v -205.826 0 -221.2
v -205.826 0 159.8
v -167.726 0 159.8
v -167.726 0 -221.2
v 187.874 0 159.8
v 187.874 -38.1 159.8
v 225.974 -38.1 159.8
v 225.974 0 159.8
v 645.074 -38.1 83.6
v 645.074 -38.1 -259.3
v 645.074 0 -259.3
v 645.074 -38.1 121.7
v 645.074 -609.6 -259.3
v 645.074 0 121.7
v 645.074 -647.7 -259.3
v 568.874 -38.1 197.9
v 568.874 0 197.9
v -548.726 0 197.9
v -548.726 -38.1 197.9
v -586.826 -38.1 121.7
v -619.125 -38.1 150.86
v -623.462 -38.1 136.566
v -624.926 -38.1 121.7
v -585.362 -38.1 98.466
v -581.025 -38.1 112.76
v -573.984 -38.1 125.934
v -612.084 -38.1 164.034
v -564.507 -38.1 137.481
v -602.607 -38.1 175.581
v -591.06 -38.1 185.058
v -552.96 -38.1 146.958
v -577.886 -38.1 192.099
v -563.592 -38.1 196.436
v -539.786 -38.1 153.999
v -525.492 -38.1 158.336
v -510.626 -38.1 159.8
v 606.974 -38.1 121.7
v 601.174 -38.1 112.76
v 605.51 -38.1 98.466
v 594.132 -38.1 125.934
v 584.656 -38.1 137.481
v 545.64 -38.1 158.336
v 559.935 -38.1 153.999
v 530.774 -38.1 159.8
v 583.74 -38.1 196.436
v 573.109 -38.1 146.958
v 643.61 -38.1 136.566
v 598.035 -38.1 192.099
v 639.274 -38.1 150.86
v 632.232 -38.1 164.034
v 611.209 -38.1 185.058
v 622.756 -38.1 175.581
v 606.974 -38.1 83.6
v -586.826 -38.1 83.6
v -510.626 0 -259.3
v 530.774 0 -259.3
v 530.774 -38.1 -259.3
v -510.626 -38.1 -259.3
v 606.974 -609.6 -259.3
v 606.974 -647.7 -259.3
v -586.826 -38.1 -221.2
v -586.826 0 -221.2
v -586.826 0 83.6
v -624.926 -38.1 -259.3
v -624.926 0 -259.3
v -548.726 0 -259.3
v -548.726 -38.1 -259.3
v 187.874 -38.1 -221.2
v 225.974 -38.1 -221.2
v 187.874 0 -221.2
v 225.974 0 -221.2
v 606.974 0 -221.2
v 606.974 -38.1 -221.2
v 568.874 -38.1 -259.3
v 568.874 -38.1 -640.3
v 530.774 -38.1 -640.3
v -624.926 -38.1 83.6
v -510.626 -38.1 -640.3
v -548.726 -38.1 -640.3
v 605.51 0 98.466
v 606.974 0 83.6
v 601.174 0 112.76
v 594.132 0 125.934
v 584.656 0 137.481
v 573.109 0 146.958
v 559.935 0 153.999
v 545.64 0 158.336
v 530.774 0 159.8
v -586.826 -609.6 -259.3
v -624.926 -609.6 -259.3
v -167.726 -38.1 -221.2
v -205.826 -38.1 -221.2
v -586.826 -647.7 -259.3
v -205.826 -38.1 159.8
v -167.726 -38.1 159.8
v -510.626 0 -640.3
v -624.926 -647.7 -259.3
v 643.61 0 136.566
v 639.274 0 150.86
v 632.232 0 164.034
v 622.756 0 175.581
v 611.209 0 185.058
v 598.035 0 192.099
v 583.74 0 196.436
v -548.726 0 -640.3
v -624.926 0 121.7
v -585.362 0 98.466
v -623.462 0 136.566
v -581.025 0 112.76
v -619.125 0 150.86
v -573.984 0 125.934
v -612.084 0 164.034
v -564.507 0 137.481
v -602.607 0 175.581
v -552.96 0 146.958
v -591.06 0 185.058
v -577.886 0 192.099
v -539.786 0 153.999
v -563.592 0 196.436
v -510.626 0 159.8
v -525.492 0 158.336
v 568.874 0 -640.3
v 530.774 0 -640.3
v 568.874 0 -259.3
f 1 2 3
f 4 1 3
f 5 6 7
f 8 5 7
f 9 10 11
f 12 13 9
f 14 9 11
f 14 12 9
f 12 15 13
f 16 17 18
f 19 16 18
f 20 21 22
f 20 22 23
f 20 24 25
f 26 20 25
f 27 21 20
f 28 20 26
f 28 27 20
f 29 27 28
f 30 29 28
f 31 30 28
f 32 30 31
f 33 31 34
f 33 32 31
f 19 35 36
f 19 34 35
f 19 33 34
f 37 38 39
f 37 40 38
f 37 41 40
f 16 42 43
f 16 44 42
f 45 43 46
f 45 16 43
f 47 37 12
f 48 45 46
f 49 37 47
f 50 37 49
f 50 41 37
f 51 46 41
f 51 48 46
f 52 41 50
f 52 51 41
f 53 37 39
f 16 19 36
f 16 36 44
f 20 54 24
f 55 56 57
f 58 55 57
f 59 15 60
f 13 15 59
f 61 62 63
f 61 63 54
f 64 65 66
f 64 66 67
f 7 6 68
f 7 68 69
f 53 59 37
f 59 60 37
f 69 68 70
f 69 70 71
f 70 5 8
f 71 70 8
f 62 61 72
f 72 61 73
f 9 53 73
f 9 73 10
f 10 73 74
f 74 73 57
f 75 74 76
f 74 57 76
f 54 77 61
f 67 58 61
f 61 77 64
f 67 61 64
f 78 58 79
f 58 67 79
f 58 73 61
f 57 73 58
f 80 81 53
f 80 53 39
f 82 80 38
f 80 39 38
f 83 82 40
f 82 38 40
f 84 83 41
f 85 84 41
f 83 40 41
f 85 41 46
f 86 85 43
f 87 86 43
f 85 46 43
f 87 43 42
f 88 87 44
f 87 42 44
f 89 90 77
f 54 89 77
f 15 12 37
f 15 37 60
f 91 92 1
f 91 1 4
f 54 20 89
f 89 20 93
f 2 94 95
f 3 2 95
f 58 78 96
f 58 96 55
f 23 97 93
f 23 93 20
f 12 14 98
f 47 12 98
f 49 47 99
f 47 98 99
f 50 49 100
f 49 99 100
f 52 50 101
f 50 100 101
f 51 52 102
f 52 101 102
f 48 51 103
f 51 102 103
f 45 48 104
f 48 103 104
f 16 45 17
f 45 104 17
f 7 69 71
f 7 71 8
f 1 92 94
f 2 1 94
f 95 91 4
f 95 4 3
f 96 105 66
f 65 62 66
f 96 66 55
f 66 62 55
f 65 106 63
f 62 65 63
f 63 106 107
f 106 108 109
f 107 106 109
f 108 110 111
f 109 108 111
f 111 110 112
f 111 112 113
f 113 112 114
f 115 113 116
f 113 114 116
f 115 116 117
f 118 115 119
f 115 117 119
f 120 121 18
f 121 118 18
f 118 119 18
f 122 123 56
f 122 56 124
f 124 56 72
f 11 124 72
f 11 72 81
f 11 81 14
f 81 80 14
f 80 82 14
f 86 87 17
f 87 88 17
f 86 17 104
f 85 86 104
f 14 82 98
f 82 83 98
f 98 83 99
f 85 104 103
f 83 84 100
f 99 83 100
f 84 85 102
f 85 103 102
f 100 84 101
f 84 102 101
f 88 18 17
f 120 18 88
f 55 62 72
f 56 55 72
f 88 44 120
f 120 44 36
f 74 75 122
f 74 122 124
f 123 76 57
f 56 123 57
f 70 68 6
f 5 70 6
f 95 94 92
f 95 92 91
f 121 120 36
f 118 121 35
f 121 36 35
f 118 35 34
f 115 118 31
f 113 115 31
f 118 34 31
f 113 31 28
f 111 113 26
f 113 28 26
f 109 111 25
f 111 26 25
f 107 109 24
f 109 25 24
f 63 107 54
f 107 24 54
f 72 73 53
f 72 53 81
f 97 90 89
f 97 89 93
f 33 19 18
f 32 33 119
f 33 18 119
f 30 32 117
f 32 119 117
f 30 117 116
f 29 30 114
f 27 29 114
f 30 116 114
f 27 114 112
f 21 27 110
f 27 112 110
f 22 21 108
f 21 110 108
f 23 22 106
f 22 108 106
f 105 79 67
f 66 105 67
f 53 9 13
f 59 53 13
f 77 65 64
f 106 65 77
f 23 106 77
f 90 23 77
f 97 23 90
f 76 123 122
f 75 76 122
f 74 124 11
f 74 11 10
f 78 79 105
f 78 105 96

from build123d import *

# Parameters (mm, degrees)
F1_DEPTH  = 38.1
F3_DEPTH  = 38.1
F4_W      = 38.1
F4_H      = 381
F5_DEPTH  = 38.1
F7_DEPTH  = 38.1
F9_DEPTH  = 38.1
F11_DEPTH = 38.1
F13_DEPTH = 38.1
F14_W     = 38.1
F14_H     = 381
F15_DEPTH = 38.1


with BuildPart() as f1:
    # F0 (on Front) → F1 (new body)
    with BuildSketch(Plane.XZ):
        with BuildLine():
            Line((568.87425, 197.899858), (-548.72575, 197.899858))
            ThreePointArc((-548.72575, 197.899858), (-602.607286, 175.581394), (-624.92575, 121.699858))
            Line((-624.92575, 121.699858), (-624.92575, -259.300142))
            Line((-624.92575, -259.300142), (645.07425, -259.300142))
            Line((645.07425, -259.300142), (645.07425, 121.699858))
            ThreePointArc((645.07425, 121.699858), (622.755787, 175.581394), (568.87425, 197.899858))
        make_face()
    extrude(amount=F1_DEPTH)

    # F2 (on face) → F3 (cut)
    with BuildSketch(Plane.XZ.offset(38.1)):
        with BuildLine():
            Line((530.77425, 159.799858), (-510.62575, 159.799858))
            ThreePointArc((-510.62575, 159.799858), (-564.507286, 137.481394), (-586.82575, 83.599858))
            Line((-586.82575, 83.599858), (-586.82575, -221.200142))
            Line((-586.82575, -221.200142), (606.97425, -221.200142))
            Line((606.97425, -221.200142), (606.97425, 83.599858))
            ThreePointArc((606.97425, 83.599858), (584.655787, 137.481394), (530.77425, 159.799858))
        make_face()
    extrude(amount=-F3_DEPTH, mode=Mode.SUBTRACT)

    # F6 (on face) → F7 (join)
    with BuildSketch(Plane.YZ.offset(645.07425)):
        Polygon((-38.1, -259.300142), (-38.1, 121.699858), (-647.7, -259.300142), align=None)
    extrude(amount=-F7_DEPTH)

    # F8 (on face) → F9 (cut)
    with BuildSketch(Plane.YZ.offset(645.07425)):
        Polygon((-38.1, 83.599858), (-609.6, -259.300142), (-38.1, -259.300142), align=None)
    extrude(amount=-F9_DEPTH, mode=Mode.SUBTRACT)

    # F10 (on face) → F11 (join)
    with BuildSketch(Plane(origin=(-624.92575, 0, 0), x_dir=(0, -1, 0), z_dir=(-1, 0, 0))):
        Polygon((647.7, -259.300142), (38.1, 121.699858), (38.1, -259.300142), align=None)
    extrude(amount=-F11_DEPTH)

    # F12 (on face) → F13 (cut)
    with BuildSketch(Plane(origin=(-624.92575, 0, 0), x_dir=(0, -1, 0), z_dir=(-1, 0, 0))):
        Polygon((38.1, 83.599858), (38.1, -259.300142), (609.6, -259.300142), align=None)
    extrude(amount=-F13_DEPTH, mode=Mode.SUBTRACT)

    # F14 (on face) → F15 (join)
    with BuildSketch(Plane.XZ.offset(38.1)):
        with Locations((-529.67575, -449.800142)):
            Rectangle(F14_W, F14_H)
        with Locations((549.82425, -449.800142)):
            Rectangle(F14_W, F14_H)
    extrude(amount=-F15_DEPTH)


with BuildPart() as f5:
    # F4 (on face) → F5 (new body)
    with BuildSketch(Plane.XZ.offset(38.1)):
        with Locations((-186.77575, -30.700142)):
            Rectangle(F4_W, F4_H)
        with Locations((206.92425, -30.700142)):
            Rectangle(F4_W, F4_H)
    extrude(amount=-F5_DEPTH)


solid = Compound([f1.part, f5.part])
